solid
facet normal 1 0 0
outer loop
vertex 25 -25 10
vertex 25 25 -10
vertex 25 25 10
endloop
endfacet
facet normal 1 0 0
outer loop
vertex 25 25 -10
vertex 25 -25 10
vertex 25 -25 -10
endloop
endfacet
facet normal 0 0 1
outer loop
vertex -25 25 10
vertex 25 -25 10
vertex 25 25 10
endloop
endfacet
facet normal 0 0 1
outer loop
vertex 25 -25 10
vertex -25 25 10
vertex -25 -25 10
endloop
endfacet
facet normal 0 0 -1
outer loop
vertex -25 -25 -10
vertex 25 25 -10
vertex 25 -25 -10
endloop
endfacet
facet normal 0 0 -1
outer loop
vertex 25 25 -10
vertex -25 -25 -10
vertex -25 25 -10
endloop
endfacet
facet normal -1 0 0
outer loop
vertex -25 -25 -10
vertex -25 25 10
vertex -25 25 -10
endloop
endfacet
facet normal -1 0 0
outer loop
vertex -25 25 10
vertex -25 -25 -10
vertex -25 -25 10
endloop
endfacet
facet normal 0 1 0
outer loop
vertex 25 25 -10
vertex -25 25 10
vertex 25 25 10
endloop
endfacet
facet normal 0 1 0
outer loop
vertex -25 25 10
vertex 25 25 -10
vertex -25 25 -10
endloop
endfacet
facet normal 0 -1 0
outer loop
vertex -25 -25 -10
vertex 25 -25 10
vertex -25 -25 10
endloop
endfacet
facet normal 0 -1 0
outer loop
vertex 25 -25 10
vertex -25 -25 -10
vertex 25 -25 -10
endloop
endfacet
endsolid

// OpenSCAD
base_dimensions=[50,50,20];

module jig() {
    module baseCut() {
    };
    module base() {
        cube(base_dimensions, center=true);
    };
    difference() {
        base();
        baseCut();
    };
};

jig();
